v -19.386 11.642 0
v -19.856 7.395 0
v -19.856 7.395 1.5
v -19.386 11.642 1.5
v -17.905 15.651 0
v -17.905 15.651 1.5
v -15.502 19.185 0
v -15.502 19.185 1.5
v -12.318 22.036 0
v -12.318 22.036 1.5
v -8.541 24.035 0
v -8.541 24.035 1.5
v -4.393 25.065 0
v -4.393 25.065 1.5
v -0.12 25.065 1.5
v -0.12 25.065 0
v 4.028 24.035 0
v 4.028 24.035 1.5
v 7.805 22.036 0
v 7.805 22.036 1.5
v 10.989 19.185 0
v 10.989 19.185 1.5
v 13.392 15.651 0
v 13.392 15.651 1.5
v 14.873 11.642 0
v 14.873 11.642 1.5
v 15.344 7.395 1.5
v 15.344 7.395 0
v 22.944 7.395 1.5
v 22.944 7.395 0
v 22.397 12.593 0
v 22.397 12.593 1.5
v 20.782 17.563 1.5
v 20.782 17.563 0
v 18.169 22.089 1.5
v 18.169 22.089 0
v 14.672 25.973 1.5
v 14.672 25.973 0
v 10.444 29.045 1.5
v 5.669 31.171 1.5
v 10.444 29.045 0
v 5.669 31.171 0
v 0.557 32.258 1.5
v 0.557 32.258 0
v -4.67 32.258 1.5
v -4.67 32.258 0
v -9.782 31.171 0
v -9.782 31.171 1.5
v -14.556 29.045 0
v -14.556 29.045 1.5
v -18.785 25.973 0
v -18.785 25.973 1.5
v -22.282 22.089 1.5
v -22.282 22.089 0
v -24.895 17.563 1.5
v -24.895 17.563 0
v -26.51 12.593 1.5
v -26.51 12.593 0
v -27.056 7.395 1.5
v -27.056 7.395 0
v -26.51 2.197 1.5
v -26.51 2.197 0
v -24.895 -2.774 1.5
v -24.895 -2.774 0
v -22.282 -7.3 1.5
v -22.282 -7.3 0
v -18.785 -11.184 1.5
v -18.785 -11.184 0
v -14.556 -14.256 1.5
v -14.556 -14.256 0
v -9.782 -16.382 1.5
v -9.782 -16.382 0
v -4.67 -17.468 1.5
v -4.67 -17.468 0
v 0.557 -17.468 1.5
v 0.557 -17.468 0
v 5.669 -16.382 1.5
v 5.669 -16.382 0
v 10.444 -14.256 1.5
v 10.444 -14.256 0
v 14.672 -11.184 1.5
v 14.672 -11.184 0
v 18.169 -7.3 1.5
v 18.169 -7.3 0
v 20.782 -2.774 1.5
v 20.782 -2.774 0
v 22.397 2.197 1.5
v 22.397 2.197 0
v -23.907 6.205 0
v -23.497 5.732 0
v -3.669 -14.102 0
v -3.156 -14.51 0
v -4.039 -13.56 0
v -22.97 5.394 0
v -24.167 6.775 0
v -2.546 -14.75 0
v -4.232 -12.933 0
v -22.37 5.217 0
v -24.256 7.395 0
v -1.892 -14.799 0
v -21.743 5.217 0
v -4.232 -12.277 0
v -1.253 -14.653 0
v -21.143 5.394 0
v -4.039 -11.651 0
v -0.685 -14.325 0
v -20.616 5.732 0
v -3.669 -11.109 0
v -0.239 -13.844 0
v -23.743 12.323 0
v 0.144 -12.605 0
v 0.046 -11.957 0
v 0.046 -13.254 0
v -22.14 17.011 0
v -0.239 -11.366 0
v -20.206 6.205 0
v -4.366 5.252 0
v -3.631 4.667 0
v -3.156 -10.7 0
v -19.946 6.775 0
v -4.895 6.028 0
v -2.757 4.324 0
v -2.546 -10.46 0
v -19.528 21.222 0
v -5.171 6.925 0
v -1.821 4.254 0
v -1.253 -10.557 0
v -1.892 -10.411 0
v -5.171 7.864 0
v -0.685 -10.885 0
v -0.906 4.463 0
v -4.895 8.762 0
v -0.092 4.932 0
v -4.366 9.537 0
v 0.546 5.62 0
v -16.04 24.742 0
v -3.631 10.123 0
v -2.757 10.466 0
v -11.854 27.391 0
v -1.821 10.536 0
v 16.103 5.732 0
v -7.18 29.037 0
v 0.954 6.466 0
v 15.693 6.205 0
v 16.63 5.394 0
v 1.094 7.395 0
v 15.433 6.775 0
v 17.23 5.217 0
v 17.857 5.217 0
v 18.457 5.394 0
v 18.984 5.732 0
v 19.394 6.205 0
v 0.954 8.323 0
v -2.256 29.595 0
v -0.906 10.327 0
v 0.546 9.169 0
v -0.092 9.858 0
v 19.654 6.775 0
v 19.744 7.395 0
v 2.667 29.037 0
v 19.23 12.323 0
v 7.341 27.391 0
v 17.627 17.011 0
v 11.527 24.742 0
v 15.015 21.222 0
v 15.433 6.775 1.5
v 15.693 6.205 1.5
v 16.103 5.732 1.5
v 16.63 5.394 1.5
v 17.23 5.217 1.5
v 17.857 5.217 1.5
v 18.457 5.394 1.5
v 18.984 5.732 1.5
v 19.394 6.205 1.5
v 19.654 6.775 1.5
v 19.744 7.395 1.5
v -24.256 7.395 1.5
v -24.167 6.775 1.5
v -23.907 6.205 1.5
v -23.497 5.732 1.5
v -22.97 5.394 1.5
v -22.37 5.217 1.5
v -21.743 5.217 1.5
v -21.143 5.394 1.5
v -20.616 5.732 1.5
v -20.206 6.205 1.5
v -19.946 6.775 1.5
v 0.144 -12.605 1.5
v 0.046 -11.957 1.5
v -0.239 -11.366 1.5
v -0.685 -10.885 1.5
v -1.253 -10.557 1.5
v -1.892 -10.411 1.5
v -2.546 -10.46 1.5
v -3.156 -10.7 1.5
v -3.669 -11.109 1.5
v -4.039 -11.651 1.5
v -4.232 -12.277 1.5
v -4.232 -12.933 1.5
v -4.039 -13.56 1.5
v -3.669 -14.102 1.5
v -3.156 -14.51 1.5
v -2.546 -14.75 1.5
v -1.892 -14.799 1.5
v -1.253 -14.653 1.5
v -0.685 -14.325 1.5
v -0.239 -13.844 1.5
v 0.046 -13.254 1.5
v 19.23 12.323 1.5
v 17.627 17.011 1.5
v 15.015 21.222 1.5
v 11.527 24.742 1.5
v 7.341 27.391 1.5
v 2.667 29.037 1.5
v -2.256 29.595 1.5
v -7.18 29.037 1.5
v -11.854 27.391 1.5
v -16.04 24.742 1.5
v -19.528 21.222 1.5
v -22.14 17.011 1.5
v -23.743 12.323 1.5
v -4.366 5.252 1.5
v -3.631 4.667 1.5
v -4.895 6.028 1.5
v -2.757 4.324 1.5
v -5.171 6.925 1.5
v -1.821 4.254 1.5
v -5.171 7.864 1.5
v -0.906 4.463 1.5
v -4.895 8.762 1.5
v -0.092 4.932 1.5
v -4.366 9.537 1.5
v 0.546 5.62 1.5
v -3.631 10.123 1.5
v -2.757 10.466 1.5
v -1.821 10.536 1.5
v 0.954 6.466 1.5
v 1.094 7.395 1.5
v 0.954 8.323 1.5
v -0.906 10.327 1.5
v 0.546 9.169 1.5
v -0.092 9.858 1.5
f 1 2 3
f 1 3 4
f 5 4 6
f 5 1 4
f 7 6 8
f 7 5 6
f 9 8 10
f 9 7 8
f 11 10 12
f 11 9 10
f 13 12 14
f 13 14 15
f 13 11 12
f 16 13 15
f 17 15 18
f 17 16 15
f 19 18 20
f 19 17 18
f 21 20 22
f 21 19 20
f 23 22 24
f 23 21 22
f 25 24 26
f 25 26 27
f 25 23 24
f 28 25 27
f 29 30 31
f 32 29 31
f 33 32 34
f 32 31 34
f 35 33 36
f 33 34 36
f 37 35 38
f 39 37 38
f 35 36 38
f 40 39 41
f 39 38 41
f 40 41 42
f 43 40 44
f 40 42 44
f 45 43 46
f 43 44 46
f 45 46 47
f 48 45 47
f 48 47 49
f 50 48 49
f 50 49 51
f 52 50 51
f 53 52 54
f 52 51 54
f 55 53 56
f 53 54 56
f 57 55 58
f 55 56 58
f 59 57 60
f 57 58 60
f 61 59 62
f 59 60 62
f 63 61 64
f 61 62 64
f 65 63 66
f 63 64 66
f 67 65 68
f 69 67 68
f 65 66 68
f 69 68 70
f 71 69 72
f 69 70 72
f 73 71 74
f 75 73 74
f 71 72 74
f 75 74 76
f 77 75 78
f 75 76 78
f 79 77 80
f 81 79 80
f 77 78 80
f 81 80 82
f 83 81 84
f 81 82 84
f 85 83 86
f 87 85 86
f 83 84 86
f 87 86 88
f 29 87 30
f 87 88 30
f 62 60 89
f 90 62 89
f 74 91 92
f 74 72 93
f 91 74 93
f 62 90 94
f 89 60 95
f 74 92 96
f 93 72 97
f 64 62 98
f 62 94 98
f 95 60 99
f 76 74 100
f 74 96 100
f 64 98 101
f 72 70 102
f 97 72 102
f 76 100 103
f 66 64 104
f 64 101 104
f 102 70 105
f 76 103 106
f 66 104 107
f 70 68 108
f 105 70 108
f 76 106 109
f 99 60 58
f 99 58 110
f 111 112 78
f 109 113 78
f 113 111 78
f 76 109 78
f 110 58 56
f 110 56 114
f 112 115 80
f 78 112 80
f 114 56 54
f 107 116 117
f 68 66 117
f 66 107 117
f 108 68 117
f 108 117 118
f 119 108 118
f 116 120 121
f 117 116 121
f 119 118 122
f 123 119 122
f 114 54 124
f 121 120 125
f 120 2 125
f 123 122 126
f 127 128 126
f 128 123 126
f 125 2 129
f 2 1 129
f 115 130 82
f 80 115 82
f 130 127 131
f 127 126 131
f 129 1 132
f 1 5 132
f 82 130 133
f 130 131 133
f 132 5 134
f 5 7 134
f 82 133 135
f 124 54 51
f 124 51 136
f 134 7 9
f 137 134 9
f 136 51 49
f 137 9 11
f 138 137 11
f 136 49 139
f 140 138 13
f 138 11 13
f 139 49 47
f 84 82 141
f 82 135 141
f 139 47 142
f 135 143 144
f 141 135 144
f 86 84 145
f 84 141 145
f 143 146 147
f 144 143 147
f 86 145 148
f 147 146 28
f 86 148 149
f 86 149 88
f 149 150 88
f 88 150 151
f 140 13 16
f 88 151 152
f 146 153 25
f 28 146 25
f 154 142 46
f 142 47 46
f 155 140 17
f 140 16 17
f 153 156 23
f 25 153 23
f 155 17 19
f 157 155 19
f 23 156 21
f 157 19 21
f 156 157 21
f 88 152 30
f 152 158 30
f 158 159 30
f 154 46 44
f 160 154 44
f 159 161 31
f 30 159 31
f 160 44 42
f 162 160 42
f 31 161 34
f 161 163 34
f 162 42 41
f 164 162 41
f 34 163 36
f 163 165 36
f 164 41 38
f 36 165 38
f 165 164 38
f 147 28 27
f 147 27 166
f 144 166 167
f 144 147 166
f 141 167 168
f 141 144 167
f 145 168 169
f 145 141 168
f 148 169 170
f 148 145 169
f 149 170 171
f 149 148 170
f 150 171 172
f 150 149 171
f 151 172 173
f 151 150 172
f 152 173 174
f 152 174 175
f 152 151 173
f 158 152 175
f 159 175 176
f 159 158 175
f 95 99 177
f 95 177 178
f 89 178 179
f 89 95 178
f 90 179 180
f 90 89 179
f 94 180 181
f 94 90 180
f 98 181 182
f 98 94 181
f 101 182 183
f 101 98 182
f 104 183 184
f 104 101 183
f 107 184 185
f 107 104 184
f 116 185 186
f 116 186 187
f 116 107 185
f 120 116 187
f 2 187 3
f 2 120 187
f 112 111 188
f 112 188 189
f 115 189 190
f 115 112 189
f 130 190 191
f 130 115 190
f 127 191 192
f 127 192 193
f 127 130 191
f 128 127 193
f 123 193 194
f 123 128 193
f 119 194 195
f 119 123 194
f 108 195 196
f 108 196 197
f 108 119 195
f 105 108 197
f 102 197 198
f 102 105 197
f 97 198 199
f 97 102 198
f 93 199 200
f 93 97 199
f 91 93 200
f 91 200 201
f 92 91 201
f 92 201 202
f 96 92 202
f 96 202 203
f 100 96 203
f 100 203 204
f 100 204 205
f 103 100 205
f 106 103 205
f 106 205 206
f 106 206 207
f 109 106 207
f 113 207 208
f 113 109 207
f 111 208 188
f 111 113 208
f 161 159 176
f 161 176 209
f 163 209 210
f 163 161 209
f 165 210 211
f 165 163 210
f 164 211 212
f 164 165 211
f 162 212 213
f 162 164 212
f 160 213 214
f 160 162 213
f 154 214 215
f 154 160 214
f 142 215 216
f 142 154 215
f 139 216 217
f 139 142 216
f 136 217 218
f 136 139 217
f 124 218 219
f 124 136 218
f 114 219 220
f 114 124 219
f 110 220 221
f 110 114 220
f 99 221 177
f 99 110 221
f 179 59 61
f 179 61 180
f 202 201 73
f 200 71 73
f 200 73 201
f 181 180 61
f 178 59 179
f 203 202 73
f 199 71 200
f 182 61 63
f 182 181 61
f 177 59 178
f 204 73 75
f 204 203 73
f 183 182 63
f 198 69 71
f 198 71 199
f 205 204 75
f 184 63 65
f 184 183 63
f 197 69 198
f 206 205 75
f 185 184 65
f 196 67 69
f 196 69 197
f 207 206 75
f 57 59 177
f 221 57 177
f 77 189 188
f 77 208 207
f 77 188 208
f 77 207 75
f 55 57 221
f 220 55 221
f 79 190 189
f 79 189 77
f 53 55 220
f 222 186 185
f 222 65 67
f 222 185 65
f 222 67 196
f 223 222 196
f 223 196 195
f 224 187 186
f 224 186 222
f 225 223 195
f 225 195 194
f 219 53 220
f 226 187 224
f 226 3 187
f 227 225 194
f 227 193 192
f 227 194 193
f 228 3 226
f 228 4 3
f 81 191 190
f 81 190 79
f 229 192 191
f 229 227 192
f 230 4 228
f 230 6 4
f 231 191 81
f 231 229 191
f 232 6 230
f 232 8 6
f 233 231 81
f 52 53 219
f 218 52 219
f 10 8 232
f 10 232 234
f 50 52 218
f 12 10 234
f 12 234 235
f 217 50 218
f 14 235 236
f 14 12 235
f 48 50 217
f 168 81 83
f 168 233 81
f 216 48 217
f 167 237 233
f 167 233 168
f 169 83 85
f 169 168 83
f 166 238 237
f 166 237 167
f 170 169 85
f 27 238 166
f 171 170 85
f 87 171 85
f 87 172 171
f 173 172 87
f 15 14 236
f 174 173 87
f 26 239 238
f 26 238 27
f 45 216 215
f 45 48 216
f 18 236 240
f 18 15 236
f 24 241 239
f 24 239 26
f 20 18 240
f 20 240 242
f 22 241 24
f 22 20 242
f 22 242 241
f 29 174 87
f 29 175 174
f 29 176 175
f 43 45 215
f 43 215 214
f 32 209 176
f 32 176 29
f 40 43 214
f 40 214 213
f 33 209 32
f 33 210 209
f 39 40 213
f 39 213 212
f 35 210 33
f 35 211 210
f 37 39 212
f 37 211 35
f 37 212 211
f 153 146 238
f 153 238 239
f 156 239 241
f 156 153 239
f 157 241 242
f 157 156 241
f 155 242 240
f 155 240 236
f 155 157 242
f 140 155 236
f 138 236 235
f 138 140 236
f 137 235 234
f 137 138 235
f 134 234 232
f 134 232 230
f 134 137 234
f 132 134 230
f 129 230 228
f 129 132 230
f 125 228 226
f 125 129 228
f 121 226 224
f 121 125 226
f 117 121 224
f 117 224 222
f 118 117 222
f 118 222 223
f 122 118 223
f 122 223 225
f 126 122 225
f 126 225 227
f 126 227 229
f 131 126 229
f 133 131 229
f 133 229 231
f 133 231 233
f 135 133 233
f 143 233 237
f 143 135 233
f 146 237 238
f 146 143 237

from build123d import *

# Parameters (mm, degrees)
SKETCH1_R           = 25
SKETCH1_R_2         = 2.2
SKETCH1_R_3         = 3.15
BOSS_EXTRUDE1_DEPTH = 1.5


with BuildPart() as part:
    # Sketch1 → Boss-Extrude1 (new body)
    with BuildSketch(Plane.XY):
        with Locations((-2.056478496, 7.394811009)):
            Circle(SKETCH1_R)
        with Locations((-2.056478496, -12.605188991)):
            Circle(SKETCH1_R_2, mode=Mode.SUBTRACT)
        with Locations((-2.056478496, 7.394811009)):
            Circle(SKETCH1_R_3, mode=Mode.SUBTRACT)
        with BuildLine():
            ThreePointArc((19.743521504, 7.394811009), (-2.256478496, 29.594811009), (-24.256478496, 7.394811009))
            ThreePointArc((-24.256478496, 7.394811009), (-22.056478496, 5.194811009), (-19.856478496, 7.394811009))
            ThreePointArc((-19.856478496, 7.394811009), (-2.256478496, 25.194811009), (15.343521504, 7.394811009))
            ThreePointArc((15.343521504, 7.394811009), (17.543521504, 5.194811009), (19.743521504, 7.394811009))
        make_face(mode=Mode.SUBTRACT)
    extrude(amount=BOSS_EXTRUDE1_DEPTH)


solid = part.part
